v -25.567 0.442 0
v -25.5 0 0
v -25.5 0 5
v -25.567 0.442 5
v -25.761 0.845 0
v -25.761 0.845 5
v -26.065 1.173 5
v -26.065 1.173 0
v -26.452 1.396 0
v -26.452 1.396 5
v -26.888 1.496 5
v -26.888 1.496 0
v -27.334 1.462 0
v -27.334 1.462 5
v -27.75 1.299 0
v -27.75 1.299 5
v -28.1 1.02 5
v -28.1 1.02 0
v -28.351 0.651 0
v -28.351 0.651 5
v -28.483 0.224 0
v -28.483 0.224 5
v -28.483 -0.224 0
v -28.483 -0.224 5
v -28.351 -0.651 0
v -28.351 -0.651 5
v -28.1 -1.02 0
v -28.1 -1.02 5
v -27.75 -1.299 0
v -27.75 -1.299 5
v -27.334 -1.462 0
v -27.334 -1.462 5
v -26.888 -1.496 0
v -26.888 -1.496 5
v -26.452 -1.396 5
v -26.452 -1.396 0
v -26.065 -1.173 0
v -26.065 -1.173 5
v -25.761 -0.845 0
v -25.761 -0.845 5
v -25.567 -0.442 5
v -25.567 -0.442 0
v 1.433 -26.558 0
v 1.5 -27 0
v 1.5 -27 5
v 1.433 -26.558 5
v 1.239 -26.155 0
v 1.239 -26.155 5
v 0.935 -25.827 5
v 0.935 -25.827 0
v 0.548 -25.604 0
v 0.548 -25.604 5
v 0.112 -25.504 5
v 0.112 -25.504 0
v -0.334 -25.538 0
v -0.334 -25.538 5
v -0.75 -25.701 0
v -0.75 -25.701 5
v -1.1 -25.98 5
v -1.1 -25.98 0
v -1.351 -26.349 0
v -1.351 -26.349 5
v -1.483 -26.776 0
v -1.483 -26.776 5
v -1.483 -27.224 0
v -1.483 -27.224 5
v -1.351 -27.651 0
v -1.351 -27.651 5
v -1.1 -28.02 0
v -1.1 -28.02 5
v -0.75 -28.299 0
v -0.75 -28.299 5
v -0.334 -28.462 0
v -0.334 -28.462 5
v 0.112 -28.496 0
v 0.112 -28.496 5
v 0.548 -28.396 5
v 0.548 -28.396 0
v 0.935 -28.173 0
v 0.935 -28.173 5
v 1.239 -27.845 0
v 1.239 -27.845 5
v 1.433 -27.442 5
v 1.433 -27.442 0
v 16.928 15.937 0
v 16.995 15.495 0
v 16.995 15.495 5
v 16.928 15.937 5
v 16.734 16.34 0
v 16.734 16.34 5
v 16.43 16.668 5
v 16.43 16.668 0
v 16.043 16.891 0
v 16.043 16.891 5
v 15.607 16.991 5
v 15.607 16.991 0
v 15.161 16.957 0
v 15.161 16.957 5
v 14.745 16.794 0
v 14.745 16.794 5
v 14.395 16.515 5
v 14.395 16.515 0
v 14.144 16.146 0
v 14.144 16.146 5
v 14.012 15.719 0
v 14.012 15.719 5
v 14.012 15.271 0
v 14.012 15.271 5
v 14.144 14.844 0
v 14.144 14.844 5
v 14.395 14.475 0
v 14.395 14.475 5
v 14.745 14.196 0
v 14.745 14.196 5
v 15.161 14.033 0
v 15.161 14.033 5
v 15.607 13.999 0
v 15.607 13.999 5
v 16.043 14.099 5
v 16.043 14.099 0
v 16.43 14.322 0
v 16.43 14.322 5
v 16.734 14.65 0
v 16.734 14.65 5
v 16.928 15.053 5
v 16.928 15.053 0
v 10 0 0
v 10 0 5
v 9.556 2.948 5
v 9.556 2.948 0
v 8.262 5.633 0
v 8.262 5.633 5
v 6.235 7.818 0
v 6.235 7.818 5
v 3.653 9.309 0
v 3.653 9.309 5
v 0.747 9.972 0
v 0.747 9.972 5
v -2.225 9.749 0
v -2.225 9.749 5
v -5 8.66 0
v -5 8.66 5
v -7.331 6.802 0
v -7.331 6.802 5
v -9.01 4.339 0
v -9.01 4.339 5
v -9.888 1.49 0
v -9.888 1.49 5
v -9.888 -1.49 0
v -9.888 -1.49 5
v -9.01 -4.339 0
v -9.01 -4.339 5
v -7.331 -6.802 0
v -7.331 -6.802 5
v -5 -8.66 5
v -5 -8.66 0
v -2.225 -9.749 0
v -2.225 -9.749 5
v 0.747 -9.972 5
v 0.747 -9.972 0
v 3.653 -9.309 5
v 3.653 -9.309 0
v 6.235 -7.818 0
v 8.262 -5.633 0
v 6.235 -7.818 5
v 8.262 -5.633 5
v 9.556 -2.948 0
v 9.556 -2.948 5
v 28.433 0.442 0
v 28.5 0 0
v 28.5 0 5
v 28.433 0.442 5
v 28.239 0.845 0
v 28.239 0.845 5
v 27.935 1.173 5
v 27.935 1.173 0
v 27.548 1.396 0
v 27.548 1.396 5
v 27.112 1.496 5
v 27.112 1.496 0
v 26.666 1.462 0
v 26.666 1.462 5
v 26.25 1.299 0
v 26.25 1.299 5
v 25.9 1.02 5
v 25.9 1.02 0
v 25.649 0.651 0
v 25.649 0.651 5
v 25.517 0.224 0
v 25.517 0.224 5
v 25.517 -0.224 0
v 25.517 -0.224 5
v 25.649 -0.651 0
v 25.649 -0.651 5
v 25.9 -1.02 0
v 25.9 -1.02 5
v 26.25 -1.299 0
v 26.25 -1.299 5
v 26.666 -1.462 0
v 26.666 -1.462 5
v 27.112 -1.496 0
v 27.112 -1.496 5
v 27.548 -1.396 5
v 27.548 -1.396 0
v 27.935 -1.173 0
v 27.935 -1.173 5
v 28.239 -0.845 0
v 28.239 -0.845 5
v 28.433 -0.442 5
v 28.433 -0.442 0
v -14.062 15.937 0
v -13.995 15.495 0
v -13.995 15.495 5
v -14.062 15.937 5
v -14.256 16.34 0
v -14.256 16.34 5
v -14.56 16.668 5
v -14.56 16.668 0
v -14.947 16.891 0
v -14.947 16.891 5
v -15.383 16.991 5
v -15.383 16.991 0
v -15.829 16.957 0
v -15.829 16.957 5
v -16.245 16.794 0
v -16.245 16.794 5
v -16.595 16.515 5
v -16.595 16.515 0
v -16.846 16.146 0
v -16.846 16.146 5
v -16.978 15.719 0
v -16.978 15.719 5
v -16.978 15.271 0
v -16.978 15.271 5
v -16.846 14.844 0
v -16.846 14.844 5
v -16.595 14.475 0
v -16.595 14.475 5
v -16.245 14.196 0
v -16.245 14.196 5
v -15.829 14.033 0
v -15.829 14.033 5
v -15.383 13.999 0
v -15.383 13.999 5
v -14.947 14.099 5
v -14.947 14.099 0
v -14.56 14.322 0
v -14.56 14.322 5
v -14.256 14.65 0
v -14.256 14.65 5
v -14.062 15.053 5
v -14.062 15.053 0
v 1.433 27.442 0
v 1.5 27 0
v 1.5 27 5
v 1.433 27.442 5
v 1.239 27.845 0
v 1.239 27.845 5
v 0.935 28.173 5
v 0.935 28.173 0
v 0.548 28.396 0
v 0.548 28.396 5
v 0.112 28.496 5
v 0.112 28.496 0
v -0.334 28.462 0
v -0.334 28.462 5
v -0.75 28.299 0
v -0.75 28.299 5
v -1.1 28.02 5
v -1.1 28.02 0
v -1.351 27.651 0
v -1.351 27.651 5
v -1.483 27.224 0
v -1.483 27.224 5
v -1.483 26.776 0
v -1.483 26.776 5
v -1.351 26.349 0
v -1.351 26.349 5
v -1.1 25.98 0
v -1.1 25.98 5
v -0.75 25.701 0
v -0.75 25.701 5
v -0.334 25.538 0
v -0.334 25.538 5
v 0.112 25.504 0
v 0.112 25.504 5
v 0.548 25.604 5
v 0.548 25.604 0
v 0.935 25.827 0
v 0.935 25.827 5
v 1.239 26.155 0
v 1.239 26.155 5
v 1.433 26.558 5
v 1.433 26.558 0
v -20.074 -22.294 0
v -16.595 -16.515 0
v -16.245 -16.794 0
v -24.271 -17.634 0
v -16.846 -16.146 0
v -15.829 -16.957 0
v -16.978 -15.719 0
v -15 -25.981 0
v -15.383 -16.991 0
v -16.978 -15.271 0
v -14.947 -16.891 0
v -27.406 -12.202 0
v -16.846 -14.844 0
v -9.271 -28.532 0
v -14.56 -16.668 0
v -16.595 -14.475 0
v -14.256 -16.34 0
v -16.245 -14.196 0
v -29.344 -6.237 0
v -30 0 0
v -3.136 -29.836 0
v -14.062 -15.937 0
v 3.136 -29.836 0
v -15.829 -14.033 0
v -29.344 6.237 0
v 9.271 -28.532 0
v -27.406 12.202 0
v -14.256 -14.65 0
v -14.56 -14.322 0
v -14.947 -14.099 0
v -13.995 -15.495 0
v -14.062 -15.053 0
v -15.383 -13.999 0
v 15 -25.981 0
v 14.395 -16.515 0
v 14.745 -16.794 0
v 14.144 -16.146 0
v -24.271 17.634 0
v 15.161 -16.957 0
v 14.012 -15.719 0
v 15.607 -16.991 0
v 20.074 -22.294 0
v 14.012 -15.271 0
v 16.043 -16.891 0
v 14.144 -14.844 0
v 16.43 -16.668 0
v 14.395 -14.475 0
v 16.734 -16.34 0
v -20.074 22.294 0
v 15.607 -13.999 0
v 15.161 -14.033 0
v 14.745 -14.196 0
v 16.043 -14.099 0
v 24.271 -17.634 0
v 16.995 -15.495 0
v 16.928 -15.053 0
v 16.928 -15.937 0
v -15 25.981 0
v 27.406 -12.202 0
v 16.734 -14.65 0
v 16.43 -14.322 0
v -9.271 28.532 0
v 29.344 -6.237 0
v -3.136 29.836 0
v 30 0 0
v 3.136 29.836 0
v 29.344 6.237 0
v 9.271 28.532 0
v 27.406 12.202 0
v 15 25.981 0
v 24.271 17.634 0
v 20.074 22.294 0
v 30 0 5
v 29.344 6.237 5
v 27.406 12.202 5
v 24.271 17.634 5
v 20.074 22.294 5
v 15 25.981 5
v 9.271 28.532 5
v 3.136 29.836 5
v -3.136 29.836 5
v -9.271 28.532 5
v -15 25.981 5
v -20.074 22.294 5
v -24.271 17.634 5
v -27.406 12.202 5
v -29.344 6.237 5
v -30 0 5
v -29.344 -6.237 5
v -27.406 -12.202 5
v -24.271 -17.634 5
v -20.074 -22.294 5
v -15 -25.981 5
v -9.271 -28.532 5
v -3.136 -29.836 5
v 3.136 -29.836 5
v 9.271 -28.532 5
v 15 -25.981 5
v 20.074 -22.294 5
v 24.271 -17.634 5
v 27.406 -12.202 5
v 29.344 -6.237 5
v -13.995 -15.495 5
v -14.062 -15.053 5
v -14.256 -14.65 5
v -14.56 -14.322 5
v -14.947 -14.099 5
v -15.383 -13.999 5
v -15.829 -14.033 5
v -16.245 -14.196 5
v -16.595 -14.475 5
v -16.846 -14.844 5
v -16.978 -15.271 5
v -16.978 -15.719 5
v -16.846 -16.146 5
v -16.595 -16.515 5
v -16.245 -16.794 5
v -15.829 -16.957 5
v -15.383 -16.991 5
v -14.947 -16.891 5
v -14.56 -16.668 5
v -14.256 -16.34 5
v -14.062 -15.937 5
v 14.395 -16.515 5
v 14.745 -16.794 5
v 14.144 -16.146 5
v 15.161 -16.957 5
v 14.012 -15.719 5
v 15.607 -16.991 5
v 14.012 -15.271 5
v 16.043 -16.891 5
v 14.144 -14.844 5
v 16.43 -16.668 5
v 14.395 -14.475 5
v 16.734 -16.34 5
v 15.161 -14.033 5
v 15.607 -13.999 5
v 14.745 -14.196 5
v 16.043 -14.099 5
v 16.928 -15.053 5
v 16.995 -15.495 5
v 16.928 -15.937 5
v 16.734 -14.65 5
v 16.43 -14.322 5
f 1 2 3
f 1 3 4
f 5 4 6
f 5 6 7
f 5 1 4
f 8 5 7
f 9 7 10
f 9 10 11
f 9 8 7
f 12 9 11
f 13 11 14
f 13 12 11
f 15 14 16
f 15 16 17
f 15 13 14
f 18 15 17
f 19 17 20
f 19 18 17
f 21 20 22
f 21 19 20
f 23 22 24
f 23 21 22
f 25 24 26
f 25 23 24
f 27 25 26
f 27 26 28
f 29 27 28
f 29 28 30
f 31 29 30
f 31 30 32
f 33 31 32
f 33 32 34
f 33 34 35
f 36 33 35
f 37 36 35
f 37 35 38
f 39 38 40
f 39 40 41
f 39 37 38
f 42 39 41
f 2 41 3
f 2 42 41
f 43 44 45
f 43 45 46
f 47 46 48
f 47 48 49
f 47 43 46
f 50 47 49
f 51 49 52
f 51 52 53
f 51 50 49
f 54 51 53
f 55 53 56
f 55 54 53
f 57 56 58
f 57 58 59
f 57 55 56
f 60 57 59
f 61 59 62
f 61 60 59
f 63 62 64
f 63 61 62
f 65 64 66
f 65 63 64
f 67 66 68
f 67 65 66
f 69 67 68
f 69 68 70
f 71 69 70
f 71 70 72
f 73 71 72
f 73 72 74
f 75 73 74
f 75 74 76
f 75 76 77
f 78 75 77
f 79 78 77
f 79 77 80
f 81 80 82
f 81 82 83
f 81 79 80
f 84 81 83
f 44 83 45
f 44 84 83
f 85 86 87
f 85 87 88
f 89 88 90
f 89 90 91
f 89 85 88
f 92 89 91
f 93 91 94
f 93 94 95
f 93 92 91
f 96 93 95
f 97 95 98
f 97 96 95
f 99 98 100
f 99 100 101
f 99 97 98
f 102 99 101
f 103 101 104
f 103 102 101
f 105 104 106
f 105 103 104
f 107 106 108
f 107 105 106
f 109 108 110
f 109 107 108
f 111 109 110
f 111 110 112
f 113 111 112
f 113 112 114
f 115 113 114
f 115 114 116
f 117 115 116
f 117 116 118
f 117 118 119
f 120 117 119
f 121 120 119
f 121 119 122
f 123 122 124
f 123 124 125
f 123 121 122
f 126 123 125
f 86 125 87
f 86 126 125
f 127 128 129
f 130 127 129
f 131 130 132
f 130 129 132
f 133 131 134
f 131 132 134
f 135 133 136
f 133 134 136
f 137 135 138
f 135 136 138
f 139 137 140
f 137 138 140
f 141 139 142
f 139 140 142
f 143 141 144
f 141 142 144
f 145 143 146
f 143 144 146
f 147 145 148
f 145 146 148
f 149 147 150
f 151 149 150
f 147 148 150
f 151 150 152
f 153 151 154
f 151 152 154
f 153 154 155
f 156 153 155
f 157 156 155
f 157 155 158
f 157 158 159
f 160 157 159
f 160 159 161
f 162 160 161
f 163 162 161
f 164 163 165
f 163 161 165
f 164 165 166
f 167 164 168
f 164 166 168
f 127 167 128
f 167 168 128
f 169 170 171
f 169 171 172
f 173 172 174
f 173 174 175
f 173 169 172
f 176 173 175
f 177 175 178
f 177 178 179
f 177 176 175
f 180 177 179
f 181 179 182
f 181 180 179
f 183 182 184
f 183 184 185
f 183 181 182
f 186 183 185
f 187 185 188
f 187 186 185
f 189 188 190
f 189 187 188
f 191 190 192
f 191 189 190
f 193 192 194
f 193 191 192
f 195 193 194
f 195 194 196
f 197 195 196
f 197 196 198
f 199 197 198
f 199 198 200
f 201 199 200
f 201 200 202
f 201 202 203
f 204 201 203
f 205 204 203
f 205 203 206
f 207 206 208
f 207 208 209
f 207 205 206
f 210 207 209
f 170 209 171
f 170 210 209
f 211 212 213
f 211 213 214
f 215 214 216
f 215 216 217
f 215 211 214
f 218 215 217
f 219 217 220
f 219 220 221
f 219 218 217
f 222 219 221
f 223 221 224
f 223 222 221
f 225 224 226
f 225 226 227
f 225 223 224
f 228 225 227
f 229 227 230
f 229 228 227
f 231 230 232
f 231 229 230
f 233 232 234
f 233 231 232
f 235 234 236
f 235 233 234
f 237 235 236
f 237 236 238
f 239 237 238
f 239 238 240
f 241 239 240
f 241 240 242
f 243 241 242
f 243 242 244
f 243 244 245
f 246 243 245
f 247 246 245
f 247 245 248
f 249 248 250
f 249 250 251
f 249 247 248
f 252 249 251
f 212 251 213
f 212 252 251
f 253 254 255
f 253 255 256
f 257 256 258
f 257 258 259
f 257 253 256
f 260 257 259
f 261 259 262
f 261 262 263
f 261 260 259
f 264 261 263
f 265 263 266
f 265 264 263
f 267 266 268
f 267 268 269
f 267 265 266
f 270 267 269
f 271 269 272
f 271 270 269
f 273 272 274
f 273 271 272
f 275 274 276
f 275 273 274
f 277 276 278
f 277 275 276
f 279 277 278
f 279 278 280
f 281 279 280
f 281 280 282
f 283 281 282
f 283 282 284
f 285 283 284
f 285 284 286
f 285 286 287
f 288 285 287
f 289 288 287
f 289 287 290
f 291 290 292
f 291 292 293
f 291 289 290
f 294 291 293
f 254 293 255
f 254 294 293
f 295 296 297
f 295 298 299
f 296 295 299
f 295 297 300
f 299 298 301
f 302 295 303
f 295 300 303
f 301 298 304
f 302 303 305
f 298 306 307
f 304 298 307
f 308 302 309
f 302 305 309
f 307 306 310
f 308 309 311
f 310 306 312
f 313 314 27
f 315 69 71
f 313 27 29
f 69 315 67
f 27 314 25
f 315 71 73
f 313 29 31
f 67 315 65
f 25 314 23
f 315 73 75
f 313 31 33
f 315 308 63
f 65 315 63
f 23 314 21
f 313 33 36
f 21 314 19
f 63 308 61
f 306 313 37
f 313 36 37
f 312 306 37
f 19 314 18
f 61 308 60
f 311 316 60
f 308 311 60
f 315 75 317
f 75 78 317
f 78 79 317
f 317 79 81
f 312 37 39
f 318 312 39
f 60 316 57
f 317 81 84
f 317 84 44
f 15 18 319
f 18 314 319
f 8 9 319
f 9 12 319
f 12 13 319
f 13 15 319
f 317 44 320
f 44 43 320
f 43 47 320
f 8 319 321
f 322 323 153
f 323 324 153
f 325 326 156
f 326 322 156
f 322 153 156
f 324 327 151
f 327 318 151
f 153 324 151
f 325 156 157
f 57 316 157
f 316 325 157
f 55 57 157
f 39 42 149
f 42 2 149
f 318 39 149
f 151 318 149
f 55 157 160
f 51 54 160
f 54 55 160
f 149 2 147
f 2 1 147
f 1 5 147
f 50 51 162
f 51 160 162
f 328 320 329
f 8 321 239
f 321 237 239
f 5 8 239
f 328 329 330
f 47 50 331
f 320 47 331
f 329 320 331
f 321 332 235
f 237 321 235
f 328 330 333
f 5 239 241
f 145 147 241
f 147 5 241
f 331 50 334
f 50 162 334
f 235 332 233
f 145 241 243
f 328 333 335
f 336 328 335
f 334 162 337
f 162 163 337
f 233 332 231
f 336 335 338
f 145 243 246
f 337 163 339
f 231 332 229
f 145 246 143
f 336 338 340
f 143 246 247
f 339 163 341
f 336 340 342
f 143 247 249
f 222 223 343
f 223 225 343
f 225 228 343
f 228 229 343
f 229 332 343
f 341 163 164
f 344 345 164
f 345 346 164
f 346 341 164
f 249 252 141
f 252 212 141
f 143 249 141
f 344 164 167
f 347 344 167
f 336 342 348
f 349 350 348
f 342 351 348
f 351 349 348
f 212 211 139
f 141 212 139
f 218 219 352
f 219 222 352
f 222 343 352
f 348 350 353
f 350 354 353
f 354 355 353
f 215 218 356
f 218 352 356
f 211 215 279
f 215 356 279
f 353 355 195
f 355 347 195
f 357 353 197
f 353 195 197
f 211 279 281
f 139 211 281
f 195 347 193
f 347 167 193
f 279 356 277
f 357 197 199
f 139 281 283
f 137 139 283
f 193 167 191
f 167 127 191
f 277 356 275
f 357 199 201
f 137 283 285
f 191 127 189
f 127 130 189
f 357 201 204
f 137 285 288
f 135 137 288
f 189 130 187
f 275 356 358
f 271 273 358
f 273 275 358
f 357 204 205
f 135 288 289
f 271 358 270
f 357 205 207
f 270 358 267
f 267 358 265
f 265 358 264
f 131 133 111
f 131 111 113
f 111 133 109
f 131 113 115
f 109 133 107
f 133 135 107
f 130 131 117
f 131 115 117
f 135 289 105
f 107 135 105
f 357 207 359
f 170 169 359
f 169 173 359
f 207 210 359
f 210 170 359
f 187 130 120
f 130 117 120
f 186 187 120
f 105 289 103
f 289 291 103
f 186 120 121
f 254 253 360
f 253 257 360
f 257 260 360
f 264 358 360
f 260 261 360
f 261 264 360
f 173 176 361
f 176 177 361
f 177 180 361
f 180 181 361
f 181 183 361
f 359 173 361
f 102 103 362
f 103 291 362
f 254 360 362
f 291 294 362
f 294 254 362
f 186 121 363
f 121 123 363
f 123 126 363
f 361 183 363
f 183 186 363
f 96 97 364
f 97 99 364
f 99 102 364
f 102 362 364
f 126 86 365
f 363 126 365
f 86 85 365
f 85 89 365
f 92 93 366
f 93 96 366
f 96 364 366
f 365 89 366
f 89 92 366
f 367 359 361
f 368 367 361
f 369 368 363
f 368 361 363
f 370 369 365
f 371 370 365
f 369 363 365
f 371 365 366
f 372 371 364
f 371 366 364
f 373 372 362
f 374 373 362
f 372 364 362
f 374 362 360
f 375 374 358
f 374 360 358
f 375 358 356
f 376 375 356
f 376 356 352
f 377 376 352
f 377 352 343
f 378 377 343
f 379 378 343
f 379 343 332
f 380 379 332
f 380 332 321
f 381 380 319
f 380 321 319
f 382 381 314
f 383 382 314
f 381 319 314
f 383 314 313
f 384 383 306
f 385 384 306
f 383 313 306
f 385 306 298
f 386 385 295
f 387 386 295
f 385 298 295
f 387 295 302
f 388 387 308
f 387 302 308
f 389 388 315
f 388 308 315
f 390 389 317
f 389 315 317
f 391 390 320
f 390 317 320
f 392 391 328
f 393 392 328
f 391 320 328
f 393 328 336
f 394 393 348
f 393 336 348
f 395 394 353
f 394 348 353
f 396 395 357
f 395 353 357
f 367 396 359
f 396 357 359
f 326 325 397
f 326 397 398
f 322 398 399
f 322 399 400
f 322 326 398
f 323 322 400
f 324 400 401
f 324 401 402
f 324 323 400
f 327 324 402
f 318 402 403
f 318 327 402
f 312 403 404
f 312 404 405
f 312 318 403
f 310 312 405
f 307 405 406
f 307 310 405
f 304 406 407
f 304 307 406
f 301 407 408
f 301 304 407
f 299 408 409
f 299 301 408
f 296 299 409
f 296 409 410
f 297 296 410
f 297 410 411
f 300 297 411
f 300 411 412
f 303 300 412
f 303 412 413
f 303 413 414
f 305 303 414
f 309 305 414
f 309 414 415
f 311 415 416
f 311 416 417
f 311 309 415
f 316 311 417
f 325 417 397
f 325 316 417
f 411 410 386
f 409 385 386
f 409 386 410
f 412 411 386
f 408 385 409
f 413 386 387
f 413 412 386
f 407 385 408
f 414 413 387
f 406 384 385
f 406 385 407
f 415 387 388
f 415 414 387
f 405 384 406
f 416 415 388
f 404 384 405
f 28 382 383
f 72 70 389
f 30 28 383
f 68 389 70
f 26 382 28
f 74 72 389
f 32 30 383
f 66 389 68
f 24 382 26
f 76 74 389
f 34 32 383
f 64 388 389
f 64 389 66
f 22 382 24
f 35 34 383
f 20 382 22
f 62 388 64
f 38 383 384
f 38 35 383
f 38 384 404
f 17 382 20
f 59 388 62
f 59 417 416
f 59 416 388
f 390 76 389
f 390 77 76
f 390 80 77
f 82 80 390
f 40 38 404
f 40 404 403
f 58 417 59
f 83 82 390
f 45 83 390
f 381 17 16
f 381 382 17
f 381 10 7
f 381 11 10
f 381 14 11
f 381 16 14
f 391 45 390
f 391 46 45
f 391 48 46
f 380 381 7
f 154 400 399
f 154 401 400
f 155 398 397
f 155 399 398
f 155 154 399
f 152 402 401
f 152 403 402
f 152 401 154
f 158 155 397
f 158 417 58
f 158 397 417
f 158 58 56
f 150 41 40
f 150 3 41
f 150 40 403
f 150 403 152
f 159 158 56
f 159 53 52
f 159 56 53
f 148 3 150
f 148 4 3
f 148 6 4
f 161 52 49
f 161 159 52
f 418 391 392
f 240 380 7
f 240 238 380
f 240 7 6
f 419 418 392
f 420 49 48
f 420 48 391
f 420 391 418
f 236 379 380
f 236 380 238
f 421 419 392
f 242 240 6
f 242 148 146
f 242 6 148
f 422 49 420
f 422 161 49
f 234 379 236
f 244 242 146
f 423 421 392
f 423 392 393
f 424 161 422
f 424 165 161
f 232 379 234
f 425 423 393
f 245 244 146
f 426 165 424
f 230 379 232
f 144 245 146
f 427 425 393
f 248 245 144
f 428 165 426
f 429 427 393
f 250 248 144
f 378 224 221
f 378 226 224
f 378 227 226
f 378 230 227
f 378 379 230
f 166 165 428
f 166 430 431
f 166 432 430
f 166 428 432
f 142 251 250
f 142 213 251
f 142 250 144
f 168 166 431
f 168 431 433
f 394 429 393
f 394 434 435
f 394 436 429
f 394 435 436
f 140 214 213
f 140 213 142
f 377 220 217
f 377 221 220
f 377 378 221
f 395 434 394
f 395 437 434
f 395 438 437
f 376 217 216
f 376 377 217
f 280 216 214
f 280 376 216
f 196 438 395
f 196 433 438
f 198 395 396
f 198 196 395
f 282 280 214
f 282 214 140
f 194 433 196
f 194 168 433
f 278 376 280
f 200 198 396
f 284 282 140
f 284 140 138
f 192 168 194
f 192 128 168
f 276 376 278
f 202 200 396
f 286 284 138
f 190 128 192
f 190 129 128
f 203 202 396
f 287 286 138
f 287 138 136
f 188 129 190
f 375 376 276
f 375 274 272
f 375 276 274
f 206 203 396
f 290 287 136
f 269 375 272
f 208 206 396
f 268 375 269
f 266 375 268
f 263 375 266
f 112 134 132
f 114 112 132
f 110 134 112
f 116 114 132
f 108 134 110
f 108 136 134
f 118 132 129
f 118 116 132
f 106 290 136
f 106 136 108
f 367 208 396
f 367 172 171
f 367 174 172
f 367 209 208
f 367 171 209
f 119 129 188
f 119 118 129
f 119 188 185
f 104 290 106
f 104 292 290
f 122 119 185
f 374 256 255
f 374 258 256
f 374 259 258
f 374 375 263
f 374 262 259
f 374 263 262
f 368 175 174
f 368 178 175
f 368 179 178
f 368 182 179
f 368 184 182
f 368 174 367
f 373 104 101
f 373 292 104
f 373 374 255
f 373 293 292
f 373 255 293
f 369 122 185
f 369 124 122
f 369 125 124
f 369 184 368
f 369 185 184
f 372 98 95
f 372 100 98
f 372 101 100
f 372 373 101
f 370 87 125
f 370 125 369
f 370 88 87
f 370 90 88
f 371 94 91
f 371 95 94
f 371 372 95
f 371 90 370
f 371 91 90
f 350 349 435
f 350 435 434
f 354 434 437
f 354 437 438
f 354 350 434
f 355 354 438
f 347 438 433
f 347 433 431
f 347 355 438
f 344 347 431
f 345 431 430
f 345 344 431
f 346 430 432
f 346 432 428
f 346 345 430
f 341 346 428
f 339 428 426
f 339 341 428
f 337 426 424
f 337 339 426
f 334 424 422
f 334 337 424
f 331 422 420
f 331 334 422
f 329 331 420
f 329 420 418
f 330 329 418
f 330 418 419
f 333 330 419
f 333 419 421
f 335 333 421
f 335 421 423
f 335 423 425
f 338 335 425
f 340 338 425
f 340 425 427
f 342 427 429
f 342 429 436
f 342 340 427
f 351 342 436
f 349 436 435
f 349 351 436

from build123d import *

# Parameters (mm, degrees)
SKETCH25_R          = 30
SKETCH25_R_2        = 1.5
BOSS_EXTRUDE1_DEPTH = 5
SKETCH26_R          = 10
CUT_EXTRUDE1_DEPTH  = 5


with BuildPart() as part:
    # Sketch25 → Boss-Extrude1 (new body)
    with BuildSketch(Plane.XY):
        Circle(SKETCH25_R)
        with Locations((15.495, 15.495)):
            Circle(SKETCH25_R_2, mode=Mode.SUBTRACT)
        with Locations((-15.495, 15.495)):
            Circle(SKETCH25_R_2, mode=Mode.SUBTRACT)
        with Locations((-15.495, -15.495)):
            Circle(SKETCH25_R_2, mode=Mode.SUBTRACT)
        with Locations((15.495, -15.495)):
            Circle(SKETCH25_R_2, mode=Mode.SUBTRACT)
        with Locations((0, 27)):
            Circle(SKETCH25_R_2, mode=Mode.SUBTRACT)
        with Locations((27, 0)):
            Circle(SKETCH25_R_2, mode=Mode.SUBTRACT)
        with Locations((0, -27)):
            Circle(SKETCH25_R_2, mode=Mode.SUBTRACT)
        with Locations((-27, 0)):
            Circle(SKETCH25_R_2, mode=Mode.SUBTRACT)
    extrude(amount=BOSS_EXTRUDE1_DEPTH)

    # Sketch26 → Cut-Extrude1 (cut)
    with BuildSketch(Plane.XY.offset(5)):
        Circle(SKETCH26_R)
        with Locations((-130.084851818, -8.286873835)):
            Circle(SKETCH26_R)
    extrude(amount=-CUT_EXTRUDE1_DEPTH, mode=Mode.SUBTRACT)


solid = part.part
